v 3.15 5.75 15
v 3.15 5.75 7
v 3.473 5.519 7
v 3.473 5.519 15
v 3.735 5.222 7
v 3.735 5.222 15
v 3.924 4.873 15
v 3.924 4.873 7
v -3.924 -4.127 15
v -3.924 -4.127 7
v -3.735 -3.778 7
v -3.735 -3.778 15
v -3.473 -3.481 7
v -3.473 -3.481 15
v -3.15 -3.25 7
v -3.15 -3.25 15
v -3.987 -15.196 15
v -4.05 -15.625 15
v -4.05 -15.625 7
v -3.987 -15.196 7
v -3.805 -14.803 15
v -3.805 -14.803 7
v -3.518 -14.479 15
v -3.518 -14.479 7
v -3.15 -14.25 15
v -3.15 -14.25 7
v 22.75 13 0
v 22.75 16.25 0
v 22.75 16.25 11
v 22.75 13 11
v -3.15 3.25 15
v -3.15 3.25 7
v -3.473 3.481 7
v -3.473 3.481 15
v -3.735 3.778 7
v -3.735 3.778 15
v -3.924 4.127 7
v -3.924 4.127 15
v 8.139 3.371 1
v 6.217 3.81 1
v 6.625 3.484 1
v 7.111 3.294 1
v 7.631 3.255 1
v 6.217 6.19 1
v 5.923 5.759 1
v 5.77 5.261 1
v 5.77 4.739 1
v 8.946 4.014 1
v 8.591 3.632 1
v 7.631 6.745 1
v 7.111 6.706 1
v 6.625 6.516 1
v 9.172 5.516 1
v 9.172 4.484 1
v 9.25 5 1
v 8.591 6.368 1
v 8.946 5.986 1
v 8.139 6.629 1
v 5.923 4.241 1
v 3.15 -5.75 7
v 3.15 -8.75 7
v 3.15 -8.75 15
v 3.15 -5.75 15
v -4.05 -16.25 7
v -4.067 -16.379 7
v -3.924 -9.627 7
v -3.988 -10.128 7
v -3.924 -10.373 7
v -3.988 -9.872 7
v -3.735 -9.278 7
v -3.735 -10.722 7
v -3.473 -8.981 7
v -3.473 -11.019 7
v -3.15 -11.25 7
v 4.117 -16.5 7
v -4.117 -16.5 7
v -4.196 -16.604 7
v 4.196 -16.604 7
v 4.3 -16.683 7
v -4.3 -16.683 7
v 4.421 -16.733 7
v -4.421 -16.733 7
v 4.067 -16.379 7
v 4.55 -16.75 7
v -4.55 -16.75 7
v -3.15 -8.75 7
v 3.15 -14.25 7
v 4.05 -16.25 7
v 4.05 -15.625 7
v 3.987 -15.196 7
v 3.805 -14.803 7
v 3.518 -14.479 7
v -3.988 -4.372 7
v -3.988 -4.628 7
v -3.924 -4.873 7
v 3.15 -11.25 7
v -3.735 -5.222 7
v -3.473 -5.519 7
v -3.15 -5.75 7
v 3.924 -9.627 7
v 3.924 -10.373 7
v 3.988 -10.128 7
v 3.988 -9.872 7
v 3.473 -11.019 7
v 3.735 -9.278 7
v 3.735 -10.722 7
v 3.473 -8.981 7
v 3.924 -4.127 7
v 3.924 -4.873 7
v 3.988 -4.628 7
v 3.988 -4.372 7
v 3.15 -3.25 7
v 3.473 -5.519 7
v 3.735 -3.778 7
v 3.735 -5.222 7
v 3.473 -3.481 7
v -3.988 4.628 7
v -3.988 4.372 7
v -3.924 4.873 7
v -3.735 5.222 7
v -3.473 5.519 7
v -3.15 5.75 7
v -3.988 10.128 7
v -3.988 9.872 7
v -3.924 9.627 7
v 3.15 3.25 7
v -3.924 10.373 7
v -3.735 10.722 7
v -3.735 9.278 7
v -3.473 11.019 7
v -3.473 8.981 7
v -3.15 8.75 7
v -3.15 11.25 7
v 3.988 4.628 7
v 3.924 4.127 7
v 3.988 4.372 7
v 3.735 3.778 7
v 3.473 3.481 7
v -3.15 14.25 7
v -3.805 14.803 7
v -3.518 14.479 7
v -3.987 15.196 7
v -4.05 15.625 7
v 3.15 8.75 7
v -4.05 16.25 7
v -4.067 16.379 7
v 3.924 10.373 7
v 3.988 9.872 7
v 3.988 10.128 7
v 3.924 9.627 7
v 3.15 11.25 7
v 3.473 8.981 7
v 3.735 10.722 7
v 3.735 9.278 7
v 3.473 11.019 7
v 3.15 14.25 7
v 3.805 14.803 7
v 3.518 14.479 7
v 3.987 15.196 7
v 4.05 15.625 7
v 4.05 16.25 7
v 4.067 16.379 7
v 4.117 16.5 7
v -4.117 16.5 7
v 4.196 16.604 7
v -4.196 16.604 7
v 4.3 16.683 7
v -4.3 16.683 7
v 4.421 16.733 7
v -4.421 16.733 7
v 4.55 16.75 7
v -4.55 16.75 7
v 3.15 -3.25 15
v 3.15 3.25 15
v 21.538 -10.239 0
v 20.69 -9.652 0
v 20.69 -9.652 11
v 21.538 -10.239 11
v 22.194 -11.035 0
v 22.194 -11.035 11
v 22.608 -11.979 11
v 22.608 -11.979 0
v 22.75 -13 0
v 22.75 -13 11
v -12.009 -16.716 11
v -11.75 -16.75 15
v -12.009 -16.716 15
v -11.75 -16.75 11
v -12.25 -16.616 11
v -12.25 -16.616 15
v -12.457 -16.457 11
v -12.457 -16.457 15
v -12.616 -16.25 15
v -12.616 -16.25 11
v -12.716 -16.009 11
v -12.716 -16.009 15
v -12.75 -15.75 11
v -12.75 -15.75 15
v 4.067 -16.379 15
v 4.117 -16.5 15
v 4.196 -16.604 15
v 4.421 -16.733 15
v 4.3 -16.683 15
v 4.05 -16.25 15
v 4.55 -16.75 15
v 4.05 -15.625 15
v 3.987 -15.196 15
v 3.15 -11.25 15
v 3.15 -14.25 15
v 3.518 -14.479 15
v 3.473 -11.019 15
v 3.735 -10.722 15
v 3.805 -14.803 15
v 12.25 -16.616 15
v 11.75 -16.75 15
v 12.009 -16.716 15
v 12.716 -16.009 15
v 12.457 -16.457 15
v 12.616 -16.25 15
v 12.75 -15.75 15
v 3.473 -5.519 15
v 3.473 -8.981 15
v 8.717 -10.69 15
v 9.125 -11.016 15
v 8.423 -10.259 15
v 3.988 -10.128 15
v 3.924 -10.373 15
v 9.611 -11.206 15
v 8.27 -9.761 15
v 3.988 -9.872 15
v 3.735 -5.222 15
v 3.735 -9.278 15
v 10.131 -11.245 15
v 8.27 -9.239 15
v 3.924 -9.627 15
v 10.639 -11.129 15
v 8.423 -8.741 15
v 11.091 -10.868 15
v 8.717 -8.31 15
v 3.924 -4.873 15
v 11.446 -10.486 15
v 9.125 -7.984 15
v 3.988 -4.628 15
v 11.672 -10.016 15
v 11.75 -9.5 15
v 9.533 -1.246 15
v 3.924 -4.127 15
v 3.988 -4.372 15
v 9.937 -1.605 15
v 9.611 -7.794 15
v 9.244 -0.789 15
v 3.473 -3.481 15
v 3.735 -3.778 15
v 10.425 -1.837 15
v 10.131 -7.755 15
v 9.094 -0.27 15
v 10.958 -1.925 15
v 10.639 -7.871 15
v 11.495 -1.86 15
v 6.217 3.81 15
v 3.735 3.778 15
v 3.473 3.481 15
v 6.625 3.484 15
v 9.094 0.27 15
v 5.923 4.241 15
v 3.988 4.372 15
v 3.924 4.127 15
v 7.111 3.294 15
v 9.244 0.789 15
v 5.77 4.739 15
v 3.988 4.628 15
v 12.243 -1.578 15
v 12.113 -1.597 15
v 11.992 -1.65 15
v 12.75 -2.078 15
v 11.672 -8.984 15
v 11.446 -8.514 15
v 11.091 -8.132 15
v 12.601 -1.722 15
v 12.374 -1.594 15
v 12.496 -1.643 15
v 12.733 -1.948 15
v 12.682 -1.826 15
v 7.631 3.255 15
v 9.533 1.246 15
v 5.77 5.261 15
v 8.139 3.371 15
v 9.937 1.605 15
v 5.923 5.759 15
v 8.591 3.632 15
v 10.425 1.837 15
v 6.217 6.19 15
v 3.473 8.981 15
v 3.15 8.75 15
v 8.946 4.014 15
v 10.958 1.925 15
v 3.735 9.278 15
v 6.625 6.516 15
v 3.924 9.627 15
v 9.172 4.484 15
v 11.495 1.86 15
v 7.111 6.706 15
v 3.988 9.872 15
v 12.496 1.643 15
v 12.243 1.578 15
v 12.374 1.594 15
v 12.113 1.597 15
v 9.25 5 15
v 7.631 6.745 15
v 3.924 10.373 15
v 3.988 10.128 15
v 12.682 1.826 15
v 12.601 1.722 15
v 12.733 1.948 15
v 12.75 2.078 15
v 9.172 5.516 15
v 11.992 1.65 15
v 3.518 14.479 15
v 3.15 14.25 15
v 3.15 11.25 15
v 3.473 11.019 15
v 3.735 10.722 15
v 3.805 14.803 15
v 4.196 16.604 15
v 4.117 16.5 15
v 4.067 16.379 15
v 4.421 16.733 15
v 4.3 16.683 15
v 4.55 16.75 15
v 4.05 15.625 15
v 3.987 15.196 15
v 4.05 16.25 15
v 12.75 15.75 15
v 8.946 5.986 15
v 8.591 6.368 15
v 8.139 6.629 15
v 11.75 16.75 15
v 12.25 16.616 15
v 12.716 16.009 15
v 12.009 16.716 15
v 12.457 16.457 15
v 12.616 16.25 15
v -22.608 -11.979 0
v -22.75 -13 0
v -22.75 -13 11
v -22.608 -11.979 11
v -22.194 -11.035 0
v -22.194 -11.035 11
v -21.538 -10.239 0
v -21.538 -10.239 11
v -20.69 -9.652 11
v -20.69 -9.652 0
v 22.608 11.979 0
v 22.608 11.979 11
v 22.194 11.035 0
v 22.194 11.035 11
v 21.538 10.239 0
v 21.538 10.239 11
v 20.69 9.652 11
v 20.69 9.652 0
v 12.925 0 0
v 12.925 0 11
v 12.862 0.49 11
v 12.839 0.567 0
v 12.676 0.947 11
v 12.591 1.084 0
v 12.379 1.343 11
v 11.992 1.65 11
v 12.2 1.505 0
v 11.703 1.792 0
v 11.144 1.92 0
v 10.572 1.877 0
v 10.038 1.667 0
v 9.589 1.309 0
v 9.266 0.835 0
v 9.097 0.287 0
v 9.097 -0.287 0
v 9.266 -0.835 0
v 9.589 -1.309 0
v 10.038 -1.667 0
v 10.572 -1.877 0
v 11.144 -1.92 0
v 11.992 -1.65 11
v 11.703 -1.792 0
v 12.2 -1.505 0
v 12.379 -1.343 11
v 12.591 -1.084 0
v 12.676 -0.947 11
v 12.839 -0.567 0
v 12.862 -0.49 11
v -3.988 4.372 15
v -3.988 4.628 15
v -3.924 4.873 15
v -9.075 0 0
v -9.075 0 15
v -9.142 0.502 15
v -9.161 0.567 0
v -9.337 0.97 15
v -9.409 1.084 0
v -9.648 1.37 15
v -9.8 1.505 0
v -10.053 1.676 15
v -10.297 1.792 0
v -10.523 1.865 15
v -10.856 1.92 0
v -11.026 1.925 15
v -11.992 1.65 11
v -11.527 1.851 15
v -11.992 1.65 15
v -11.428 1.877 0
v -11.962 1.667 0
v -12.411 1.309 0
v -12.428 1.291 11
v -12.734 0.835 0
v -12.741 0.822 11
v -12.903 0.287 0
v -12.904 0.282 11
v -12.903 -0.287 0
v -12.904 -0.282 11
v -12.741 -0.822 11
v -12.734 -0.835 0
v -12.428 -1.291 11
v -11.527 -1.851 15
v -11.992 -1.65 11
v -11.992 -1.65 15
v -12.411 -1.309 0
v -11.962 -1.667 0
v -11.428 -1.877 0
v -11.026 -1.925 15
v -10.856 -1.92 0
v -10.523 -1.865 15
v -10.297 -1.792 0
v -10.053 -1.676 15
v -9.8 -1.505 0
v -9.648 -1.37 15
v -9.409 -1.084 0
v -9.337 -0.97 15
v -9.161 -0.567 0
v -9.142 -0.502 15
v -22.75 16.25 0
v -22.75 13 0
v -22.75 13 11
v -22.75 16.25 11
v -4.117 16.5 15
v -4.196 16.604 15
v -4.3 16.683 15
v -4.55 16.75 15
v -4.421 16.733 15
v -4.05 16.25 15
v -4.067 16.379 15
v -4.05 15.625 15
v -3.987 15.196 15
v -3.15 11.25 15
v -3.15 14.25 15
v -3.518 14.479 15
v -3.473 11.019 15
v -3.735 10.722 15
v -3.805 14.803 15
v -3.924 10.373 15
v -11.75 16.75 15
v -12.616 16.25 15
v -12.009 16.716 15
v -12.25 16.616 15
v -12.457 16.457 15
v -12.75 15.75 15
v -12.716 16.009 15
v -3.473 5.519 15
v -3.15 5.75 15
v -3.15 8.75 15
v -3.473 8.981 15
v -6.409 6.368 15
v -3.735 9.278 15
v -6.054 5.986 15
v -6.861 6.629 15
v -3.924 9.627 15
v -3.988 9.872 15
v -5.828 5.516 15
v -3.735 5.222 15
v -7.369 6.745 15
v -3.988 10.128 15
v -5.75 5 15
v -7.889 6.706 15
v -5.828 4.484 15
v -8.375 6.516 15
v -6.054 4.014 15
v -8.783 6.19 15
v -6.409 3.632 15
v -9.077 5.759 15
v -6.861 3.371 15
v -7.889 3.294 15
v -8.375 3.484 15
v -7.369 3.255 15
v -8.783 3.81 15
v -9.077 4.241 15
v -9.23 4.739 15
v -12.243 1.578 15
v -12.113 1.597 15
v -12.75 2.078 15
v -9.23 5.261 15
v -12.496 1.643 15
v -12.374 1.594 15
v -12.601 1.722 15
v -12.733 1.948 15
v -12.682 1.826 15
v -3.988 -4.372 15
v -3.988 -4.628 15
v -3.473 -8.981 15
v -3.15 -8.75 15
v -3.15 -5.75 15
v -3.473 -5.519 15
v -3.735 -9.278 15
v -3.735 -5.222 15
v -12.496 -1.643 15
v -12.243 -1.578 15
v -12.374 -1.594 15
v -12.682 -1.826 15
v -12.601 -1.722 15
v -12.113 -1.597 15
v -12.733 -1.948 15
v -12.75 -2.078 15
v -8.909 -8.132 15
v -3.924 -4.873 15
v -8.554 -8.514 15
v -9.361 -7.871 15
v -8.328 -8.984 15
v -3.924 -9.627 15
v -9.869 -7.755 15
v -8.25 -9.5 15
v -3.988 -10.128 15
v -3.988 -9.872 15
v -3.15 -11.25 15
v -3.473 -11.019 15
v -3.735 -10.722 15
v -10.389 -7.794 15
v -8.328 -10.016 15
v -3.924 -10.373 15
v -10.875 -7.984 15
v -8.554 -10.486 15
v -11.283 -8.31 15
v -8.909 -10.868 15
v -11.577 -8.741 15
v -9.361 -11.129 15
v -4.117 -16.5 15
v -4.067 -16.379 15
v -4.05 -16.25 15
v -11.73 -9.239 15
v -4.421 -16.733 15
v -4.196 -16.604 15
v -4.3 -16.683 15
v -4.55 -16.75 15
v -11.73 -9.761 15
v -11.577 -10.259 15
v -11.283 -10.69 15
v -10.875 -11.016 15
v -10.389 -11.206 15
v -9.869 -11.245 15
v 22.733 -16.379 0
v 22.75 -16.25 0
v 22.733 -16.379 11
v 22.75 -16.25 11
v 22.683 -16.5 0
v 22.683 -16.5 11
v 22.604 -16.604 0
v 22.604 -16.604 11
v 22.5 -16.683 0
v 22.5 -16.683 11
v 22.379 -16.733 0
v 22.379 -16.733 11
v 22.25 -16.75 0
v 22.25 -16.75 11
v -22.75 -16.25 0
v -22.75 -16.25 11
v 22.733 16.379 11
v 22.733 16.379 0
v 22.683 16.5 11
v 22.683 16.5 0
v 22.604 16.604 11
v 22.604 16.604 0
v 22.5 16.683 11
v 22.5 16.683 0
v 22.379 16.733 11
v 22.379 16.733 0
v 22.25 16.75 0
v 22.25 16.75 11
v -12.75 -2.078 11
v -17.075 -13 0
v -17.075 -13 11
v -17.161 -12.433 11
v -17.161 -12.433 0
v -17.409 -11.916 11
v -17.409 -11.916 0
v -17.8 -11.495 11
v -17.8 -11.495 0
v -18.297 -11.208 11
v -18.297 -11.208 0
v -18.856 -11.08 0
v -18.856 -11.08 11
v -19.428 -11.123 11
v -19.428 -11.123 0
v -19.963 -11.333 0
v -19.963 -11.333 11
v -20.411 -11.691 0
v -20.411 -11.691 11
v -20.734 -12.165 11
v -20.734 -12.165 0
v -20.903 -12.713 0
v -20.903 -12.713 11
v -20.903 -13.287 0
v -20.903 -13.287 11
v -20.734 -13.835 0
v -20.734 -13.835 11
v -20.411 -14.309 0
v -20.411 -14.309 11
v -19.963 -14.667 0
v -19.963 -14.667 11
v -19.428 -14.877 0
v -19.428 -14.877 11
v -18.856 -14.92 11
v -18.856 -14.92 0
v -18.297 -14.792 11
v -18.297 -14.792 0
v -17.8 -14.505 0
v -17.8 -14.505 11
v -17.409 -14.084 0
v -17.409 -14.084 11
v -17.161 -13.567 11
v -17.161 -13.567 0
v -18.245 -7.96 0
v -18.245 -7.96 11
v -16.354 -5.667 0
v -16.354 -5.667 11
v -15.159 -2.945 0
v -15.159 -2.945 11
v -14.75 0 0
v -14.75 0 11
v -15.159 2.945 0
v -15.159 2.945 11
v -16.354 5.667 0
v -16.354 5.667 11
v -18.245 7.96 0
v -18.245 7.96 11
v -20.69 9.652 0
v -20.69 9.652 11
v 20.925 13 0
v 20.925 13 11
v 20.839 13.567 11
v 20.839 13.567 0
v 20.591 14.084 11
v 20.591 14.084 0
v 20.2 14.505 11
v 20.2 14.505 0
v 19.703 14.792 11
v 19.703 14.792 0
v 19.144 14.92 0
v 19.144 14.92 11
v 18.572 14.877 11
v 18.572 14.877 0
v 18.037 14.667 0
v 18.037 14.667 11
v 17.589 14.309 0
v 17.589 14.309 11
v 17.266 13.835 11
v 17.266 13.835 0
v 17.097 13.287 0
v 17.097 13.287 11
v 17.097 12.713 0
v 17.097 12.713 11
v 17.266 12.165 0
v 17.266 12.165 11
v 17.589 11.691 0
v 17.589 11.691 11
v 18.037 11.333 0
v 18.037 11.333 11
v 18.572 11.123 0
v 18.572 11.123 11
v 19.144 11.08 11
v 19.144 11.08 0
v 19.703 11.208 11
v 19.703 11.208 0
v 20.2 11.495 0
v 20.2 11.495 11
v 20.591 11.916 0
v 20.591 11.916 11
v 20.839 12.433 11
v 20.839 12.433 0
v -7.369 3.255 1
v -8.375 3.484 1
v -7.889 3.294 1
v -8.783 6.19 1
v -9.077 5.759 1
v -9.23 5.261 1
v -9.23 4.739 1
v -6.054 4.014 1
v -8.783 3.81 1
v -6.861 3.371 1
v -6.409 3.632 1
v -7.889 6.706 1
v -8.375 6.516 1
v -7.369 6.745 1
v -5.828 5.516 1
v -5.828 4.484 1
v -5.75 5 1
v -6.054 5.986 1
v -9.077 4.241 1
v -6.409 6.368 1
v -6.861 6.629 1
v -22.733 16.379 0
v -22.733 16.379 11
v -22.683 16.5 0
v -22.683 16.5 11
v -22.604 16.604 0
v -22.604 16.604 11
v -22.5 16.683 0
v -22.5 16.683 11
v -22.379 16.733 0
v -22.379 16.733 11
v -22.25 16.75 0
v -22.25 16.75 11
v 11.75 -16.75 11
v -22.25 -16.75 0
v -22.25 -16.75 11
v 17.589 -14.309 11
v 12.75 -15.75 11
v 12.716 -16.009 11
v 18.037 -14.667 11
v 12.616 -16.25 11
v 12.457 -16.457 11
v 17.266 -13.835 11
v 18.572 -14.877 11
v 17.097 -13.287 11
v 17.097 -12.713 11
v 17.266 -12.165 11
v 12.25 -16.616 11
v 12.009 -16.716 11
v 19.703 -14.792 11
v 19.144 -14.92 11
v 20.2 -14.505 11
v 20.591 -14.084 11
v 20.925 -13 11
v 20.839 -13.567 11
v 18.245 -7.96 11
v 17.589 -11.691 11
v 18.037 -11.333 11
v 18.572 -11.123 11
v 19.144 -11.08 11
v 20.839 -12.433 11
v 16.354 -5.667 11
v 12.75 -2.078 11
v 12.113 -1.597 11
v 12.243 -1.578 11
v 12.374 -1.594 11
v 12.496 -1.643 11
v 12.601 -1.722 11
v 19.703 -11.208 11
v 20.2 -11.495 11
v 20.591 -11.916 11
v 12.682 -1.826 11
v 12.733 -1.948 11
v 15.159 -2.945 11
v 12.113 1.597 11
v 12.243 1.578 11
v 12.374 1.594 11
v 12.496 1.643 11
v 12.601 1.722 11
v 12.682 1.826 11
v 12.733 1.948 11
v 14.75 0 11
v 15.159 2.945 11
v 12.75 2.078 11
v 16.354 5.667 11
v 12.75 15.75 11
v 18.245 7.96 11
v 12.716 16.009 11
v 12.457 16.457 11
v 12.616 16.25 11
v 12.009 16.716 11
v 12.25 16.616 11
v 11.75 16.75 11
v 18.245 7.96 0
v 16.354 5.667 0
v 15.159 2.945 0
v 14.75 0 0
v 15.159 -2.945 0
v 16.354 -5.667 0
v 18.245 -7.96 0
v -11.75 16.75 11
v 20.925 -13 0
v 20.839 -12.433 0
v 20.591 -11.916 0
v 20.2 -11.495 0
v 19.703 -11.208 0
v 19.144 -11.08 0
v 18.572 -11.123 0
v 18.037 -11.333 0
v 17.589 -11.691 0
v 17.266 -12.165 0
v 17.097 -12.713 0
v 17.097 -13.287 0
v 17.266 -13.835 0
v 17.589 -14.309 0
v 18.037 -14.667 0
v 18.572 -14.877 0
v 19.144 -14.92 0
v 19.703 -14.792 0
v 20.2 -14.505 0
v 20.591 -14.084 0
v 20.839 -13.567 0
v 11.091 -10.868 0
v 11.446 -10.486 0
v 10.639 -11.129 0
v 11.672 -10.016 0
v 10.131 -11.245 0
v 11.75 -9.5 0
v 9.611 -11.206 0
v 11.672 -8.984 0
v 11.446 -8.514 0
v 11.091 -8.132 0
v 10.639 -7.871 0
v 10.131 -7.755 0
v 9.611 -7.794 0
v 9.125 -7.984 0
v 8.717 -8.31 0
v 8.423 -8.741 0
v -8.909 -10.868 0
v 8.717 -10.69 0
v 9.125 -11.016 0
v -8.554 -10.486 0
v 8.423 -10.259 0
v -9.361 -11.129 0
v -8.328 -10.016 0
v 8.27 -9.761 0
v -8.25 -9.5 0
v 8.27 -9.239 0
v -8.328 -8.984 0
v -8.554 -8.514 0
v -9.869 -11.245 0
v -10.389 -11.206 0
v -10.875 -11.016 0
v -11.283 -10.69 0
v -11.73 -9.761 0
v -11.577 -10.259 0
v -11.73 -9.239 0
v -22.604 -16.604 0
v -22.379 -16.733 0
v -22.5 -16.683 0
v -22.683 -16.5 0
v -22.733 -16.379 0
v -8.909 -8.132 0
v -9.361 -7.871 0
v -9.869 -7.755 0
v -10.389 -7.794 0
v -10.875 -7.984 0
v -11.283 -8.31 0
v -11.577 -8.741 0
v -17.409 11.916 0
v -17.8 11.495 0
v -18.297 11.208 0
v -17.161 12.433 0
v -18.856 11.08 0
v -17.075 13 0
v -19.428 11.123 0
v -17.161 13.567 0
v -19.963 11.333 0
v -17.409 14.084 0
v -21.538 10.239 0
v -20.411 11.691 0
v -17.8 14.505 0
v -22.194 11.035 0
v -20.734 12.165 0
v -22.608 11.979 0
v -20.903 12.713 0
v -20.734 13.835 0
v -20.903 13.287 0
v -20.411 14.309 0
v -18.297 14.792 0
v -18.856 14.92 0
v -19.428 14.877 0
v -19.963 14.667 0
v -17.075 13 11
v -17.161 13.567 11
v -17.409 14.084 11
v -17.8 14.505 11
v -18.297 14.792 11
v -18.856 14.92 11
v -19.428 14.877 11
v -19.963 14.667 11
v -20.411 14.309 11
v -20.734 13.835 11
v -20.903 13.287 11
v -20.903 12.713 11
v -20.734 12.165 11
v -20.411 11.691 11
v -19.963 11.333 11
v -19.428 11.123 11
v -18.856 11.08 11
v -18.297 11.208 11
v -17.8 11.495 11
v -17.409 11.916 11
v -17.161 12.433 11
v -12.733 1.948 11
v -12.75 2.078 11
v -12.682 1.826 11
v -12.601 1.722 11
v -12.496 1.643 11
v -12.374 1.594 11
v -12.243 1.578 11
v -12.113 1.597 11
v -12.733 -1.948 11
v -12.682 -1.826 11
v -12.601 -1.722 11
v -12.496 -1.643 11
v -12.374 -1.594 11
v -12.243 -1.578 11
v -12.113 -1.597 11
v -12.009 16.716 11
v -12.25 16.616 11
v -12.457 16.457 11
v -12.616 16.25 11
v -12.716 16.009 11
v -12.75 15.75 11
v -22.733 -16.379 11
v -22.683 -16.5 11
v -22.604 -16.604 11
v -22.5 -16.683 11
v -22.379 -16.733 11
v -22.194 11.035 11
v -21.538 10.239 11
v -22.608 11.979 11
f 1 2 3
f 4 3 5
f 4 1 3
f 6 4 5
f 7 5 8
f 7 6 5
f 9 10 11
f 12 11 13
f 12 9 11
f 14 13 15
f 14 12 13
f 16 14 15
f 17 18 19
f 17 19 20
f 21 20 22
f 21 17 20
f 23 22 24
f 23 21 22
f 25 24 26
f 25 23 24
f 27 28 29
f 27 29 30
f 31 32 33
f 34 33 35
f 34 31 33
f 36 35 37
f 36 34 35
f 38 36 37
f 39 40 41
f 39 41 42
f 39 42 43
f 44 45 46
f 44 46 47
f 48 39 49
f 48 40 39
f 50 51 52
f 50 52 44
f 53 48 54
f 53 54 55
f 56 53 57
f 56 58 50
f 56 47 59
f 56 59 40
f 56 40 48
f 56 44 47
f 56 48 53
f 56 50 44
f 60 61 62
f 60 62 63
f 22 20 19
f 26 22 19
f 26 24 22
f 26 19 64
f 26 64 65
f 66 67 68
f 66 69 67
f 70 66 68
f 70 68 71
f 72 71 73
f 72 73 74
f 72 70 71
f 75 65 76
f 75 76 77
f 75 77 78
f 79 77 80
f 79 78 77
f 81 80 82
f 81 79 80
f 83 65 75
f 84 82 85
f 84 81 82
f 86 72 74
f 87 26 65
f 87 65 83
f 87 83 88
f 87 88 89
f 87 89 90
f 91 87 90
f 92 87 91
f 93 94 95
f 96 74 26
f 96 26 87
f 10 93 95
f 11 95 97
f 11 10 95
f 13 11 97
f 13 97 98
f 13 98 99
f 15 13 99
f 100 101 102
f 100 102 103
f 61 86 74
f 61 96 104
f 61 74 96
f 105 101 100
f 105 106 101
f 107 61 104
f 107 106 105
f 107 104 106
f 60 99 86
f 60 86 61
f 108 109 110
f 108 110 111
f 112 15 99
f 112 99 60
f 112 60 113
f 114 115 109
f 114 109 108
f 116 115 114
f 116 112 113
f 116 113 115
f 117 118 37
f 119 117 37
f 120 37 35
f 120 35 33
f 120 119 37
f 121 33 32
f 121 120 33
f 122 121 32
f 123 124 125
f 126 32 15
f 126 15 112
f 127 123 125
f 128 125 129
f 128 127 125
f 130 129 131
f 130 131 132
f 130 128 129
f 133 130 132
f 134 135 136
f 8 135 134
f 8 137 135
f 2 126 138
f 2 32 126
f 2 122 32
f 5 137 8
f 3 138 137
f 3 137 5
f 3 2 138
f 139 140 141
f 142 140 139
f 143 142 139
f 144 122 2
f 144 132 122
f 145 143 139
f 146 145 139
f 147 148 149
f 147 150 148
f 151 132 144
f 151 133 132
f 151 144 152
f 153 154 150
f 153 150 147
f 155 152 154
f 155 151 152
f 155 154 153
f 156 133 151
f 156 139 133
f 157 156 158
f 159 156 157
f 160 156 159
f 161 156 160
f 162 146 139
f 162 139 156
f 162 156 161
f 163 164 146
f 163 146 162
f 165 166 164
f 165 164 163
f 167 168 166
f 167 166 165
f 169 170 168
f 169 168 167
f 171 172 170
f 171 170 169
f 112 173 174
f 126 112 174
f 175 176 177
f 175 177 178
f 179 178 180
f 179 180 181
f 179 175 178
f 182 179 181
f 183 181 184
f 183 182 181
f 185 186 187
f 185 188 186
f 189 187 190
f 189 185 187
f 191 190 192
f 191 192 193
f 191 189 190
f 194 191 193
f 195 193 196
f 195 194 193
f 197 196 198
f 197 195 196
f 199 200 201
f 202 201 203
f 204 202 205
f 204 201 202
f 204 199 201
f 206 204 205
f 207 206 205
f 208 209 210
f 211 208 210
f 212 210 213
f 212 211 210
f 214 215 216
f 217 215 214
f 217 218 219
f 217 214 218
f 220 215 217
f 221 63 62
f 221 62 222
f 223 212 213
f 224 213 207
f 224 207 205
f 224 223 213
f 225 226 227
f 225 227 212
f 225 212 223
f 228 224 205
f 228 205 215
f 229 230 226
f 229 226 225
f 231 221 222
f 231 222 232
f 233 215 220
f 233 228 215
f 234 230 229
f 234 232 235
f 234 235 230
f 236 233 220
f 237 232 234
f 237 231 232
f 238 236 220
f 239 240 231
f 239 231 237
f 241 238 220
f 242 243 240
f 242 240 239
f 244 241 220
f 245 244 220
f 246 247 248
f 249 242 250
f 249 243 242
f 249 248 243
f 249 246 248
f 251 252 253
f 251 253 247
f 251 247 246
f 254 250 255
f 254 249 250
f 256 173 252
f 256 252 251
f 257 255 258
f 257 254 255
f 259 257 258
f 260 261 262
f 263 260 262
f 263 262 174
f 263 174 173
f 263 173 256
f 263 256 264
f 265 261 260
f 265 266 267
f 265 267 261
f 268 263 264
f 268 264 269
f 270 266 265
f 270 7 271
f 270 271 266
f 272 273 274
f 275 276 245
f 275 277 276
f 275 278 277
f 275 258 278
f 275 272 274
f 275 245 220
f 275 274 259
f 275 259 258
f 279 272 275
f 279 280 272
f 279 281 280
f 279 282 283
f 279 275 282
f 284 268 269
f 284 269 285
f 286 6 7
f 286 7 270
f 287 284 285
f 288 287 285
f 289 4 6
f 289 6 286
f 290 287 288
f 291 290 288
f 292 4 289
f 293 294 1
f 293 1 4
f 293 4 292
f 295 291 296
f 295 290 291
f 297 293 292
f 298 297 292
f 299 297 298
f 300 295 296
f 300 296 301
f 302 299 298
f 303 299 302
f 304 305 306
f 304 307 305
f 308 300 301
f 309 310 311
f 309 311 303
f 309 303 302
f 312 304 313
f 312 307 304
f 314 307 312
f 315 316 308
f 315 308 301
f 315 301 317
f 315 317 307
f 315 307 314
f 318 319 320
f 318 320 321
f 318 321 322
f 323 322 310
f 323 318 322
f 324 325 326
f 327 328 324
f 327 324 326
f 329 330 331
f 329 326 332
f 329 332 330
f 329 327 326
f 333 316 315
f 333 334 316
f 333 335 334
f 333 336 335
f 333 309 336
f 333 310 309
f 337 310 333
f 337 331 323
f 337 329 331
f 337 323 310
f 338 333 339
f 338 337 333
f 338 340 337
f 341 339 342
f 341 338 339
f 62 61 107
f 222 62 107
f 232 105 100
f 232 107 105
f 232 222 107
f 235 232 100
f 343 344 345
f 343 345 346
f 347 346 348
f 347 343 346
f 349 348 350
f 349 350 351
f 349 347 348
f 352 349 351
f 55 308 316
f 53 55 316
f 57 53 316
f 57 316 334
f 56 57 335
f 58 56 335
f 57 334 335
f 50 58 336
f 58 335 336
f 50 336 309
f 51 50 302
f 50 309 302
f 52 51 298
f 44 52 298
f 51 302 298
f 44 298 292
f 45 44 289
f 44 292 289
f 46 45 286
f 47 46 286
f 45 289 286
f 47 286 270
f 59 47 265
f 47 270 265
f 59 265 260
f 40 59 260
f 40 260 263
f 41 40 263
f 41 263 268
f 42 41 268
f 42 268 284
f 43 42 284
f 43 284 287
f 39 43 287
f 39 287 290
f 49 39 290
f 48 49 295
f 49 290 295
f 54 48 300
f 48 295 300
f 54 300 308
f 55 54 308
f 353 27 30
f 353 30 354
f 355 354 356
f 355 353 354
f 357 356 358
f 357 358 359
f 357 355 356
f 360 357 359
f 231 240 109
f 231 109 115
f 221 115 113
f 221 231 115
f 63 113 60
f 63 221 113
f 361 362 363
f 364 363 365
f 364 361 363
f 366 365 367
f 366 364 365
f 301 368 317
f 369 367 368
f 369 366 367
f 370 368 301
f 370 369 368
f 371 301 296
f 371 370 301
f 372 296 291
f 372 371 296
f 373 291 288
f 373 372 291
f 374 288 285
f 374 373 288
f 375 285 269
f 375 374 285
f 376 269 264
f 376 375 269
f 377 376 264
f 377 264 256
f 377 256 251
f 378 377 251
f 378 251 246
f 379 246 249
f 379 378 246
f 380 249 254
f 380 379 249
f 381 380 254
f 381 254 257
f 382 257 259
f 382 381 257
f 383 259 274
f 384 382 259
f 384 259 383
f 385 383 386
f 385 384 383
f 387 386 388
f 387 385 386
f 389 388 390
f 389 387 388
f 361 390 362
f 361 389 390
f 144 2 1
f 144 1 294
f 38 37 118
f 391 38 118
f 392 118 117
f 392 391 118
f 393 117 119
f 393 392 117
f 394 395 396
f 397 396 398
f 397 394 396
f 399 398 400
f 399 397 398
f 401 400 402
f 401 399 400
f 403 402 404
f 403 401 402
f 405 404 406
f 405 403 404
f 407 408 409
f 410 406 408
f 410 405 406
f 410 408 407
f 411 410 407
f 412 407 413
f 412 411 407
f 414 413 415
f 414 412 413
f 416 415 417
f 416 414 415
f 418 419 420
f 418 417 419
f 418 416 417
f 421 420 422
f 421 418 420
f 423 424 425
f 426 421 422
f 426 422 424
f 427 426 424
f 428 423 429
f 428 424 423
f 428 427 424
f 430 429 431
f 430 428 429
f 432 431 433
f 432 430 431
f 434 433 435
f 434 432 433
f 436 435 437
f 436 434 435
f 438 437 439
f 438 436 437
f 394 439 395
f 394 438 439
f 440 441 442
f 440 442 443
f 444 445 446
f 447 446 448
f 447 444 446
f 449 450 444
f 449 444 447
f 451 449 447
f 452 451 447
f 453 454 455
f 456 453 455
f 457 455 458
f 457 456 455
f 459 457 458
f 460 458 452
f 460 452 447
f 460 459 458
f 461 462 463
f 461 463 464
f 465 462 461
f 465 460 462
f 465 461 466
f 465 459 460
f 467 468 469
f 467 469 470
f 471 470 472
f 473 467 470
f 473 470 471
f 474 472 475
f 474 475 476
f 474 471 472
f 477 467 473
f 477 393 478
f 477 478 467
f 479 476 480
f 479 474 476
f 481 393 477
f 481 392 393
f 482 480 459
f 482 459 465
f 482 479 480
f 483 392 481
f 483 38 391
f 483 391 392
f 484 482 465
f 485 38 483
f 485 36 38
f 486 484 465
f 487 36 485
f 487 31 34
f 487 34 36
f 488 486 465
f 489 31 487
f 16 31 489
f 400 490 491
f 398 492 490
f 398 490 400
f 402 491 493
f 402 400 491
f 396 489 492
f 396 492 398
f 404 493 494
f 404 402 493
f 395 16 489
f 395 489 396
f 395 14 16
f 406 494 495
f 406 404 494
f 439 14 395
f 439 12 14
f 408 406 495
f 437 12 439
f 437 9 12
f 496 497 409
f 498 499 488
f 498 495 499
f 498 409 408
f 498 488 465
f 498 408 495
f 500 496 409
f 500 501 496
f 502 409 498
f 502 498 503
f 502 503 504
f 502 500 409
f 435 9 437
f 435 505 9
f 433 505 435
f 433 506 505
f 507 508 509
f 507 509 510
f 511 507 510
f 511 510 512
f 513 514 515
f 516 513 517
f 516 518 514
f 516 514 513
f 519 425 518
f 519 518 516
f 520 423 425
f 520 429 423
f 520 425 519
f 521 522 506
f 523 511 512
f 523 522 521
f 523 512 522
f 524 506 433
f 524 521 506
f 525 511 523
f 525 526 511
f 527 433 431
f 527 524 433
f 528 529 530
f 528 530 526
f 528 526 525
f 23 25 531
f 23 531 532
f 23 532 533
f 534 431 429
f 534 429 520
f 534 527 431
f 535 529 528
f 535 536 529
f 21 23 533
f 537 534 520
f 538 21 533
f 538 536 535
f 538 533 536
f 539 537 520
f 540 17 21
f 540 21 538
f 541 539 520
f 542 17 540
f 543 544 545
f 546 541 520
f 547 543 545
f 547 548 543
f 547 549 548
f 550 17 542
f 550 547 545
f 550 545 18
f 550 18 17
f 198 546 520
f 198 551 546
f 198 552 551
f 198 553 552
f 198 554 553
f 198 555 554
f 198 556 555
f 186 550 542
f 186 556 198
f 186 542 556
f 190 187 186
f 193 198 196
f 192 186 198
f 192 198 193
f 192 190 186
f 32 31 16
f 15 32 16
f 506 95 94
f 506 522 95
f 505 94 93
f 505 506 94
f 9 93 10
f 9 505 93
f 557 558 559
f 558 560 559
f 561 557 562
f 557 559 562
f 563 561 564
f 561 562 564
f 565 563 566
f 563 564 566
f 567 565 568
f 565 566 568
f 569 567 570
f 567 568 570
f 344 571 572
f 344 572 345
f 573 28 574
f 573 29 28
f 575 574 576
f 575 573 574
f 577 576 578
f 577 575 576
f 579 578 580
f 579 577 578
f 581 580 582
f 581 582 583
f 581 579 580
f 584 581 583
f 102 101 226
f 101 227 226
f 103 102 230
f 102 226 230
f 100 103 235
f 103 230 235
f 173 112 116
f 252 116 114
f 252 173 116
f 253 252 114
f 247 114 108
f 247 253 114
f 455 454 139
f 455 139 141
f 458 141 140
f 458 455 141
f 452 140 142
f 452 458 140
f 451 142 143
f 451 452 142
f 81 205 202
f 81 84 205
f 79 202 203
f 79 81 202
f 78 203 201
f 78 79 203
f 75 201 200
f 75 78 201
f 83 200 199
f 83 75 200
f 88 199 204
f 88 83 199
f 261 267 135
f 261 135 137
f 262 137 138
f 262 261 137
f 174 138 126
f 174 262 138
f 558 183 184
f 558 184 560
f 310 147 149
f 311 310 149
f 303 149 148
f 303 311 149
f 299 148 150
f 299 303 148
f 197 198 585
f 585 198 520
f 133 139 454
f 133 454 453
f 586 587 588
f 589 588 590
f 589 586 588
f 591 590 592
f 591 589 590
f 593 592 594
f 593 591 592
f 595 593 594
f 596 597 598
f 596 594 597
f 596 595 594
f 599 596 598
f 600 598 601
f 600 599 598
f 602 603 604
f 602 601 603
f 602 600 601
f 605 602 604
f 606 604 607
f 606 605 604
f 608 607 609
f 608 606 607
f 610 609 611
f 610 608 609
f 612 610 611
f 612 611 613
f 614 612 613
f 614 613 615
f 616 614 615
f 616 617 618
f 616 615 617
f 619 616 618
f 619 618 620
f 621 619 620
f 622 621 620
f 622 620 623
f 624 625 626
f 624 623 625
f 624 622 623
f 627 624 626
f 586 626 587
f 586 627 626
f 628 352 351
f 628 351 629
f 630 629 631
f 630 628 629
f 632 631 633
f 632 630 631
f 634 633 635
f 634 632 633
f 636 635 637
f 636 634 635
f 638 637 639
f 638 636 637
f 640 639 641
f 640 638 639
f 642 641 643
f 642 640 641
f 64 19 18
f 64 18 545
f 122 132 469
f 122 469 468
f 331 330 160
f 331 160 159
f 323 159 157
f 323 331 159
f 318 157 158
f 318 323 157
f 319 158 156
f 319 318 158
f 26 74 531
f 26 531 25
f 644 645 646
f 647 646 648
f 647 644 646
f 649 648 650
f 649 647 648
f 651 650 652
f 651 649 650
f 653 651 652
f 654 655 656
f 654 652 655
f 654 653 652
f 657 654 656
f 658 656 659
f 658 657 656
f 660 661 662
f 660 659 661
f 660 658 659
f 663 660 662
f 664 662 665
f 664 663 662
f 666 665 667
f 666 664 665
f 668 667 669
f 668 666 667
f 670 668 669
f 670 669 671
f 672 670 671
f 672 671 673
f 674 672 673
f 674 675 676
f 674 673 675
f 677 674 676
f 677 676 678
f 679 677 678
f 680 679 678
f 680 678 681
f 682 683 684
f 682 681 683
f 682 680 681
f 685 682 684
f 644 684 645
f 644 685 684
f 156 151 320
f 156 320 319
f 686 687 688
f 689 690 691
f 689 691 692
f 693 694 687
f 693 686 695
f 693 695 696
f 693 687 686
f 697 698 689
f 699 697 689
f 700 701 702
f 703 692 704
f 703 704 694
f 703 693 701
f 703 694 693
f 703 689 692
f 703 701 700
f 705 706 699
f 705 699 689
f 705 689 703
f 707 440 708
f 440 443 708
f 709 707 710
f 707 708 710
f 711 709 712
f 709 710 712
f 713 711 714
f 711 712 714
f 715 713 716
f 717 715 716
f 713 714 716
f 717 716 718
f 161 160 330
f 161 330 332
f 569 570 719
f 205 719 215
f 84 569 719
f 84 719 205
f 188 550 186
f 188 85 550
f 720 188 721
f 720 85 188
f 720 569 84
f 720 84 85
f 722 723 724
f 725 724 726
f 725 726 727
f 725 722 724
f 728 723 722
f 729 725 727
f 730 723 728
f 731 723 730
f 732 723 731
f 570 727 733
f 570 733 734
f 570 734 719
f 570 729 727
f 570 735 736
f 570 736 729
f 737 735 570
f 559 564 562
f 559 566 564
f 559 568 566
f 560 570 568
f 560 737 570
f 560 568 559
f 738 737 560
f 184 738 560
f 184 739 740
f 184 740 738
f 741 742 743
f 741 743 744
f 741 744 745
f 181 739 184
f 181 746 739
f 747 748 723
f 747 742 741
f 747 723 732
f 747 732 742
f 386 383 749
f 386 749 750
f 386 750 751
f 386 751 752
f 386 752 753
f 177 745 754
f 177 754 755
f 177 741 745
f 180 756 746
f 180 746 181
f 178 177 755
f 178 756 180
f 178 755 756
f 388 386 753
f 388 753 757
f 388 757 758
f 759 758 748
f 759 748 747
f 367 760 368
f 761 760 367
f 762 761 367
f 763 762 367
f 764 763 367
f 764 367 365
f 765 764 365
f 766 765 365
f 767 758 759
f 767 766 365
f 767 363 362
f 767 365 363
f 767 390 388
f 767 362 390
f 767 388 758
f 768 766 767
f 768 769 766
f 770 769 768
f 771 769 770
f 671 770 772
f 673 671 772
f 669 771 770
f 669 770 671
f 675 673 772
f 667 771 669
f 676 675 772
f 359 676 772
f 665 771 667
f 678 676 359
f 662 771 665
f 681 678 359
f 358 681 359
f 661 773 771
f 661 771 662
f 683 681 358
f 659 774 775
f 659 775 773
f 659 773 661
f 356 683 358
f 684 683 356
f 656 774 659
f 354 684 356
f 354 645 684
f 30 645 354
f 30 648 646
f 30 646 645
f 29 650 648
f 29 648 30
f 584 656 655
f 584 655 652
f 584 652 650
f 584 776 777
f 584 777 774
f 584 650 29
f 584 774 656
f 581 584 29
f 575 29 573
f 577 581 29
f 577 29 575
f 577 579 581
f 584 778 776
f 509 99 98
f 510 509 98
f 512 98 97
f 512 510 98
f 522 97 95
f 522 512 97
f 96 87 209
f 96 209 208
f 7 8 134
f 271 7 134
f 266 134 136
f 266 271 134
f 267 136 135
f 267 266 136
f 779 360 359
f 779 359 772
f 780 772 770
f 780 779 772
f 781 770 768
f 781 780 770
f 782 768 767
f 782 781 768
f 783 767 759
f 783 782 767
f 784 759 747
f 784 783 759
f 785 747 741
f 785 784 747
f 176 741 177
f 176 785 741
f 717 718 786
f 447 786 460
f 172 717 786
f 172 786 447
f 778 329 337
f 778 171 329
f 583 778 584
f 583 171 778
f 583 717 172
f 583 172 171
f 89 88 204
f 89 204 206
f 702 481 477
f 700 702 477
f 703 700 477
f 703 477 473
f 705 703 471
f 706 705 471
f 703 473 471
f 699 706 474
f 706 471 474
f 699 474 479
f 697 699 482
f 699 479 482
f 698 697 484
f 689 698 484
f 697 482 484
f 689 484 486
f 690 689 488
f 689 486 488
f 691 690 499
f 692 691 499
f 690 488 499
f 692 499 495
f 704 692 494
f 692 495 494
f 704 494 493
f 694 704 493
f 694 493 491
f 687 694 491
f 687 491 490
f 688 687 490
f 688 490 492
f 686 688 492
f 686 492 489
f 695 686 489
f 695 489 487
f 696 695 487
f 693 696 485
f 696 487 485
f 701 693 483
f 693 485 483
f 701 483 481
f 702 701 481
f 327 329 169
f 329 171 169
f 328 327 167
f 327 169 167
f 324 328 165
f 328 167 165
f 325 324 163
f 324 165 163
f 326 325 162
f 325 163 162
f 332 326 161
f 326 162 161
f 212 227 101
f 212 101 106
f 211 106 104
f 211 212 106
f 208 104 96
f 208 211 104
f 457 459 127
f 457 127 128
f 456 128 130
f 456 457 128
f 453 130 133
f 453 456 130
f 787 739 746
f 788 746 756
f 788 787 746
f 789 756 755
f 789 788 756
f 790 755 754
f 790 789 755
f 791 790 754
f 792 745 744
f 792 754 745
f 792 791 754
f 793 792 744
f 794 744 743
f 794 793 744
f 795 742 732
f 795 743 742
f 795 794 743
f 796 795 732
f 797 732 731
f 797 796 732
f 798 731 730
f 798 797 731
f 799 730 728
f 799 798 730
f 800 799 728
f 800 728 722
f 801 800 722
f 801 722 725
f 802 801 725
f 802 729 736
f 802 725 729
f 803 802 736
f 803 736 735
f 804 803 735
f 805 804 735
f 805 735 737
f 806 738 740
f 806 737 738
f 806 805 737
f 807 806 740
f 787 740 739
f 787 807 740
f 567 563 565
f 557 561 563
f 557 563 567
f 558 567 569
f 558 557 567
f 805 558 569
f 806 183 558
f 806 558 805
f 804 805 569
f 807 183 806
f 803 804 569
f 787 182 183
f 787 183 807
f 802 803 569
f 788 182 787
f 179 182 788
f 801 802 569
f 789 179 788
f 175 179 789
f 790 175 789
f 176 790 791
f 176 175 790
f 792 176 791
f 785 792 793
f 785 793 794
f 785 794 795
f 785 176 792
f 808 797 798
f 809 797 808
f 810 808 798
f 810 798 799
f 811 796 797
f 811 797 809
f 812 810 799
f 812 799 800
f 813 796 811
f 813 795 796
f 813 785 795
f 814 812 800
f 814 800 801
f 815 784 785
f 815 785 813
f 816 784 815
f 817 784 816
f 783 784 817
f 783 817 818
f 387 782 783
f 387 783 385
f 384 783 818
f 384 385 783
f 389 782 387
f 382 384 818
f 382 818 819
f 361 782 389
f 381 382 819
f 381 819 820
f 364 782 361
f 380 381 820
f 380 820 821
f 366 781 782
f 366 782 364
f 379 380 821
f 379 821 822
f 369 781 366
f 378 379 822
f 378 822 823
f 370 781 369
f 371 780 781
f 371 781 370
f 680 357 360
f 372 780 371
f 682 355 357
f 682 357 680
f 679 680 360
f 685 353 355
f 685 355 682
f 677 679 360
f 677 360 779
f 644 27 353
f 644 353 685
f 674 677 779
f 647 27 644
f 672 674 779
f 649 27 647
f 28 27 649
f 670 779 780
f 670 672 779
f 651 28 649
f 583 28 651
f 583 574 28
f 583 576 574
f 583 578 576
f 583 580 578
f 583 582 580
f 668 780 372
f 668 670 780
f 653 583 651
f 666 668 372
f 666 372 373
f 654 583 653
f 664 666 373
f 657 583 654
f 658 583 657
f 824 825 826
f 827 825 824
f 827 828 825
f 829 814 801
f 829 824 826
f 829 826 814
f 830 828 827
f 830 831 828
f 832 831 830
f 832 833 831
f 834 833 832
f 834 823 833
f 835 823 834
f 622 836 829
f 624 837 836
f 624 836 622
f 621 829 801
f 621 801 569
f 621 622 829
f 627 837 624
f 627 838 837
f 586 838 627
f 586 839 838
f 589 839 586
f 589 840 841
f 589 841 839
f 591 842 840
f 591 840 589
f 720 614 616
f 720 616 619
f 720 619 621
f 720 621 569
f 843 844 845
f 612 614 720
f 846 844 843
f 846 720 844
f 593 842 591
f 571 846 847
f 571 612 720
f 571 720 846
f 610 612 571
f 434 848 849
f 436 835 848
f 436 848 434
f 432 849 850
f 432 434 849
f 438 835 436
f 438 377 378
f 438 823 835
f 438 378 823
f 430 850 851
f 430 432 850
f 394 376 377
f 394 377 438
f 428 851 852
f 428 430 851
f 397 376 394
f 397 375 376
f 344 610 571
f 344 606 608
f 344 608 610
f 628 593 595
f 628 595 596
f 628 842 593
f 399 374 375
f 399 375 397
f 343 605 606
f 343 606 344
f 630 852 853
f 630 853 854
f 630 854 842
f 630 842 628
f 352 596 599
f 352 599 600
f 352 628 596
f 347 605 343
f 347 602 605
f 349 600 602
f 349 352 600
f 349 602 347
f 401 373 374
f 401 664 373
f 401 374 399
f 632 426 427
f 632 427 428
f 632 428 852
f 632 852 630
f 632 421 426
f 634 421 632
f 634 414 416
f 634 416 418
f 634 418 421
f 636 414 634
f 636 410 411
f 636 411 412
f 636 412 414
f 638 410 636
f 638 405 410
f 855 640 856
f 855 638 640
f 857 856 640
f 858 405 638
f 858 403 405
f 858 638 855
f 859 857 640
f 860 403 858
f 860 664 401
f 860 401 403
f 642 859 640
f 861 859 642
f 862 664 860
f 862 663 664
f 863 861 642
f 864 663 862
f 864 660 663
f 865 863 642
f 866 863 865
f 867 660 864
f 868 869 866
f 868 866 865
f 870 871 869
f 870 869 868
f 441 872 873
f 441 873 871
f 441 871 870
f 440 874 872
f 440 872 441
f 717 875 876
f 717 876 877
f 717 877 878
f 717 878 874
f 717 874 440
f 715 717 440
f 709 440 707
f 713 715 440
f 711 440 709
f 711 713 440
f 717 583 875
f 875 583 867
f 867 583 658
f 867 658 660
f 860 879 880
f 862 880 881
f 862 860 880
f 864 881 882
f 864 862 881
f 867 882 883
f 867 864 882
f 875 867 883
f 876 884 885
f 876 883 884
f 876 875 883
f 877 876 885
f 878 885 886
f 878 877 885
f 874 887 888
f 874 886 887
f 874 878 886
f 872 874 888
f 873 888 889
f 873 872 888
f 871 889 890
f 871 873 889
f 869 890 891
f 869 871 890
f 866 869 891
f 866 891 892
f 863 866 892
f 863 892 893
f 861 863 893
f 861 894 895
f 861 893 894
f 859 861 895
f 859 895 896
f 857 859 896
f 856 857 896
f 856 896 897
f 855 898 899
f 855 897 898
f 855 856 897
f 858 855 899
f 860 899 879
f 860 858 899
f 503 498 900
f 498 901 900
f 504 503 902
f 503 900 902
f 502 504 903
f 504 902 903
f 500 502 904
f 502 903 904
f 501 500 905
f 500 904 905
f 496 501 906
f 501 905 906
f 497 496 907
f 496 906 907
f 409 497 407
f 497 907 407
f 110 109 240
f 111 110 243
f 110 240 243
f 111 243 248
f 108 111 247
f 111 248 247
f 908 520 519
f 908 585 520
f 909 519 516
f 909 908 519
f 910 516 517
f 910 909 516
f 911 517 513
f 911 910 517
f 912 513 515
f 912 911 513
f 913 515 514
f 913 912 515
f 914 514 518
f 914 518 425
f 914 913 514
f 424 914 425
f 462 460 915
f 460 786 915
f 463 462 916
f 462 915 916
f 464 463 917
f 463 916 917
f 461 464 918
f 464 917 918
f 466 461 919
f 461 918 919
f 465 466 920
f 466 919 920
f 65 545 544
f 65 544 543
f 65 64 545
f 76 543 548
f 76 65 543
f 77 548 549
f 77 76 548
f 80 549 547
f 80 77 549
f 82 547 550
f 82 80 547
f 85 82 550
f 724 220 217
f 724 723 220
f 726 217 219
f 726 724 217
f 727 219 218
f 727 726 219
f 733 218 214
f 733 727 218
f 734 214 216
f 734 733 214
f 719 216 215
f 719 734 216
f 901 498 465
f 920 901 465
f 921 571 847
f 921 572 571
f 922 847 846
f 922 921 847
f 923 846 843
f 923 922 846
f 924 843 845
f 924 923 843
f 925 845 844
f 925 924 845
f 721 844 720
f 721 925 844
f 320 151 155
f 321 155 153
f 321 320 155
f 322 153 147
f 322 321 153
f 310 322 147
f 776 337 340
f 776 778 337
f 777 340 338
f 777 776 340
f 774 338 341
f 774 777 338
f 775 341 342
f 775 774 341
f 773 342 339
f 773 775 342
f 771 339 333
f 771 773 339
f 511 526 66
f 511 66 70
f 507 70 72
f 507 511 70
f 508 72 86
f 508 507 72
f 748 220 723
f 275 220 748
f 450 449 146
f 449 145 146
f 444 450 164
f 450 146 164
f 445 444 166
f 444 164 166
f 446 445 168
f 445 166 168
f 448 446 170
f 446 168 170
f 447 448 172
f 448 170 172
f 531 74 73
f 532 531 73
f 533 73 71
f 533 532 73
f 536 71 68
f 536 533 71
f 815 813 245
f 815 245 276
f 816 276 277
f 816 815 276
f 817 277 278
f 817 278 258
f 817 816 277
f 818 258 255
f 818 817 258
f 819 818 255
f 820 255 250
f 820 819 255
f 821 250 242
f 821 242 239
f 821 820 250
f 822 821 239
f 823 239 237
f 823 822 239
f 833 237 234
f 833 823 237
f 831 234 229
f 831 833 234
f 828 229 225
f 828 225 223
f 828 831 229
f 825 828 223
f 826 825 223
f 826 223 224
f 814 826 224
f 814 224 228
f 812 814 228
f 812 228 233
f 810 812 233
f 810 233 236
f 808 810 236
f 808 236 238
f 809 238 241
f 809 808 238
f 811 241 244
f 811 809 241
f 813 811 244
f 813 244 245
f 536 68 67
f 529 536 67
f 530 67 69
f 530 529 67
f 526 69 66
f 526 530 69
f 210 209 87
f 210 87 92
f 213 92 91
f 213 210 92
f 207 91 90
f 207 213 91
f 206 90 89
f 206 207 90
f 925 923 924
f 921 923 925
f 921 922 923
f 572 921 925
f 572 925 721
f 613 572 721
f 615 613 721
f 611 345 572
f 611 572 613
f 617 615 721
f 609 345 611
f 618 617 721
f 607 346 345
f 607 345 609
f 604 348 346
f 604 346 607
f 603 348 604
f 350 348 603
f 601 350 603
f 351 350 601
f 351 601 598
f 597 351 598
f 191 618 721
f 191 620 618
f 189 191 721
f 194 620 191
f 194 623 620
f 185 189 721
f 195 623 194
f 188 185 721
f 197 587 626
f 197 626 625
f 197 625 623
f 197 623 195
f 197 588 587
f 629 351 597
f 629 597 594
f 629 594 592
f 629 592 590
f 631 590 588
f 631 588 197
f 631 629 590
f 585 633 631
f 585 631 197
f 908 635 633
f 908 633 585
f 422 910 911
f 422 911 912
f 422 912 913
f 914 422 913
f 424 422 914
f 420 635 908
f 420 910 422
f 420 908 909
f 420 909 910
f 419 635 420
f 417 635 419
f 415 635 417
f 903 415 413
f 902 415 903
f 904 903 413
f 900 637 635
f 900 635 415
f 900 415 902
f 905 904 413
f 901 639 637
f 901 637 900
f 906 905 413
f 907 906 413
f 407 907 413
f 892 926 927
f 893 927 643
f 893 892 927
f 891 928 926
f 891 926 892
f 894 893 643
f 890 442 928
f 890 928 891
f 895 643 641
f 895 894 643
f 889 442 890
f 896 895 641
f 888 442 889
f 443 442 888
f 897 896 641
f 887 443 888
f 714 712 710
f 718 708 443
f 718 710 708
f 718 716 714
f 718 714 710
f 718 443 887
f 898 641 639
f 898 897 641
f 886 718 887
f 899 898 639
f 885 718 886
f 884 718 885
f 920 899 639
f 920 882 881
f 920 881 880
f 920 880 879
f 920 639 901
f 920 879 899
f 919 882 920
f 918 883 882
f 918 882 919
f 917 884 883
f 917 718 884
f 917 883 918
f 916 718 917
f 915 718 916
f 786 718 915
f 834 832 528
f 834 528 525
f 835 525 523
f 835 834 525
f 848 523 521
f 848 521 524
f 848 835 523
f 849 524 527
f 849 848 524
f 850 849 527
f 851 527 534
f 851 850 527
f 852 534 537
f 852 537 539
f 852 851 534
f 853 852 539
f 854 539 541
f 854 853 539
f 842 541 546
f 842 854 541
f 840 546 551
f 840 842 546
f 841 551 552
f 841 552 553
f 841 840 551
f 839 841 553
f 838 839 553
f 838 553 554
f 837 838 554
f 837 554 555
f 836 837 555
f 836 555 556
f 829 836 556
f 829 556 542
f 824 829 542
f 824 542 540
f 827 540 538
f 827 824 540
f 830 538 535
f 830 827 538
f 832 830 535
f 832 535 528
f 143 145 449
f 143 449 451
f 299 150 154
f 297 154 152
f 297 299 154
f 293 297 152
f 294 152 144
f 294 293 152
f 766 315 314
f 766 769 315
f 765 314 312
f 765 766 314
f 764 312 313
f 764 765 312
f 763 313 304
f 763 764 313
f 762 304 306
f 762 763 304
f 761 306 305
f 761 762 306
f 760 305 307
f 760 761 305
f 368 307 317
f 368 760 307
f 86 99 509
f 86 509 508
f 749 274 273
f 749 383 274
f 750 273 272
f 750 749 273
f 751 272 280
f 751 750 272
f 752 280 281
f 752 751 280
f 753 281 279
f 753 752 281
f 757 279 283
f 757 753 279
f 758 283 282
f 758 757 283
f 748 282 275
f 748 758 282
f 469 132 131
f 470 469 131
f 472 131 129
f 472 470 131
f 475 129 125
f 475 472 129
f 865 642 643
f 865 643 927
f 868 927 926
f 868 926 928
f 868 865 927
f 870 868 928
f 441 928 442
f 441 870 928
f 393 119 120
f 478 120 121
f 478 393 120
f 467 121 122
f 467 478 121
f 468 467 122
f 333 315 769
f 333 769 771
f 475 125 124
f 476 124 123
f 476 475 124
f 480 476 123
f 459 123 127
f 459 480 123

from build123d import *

# Parameters (mm, degrees)
SKETCH1_R           = 1.75
SKETCH1_R_2         = 1.925
BOSS_EXTRUDE1_DEPTH = 15
CUT_EXTRUDE1_DEPTH  = 8
SKETCH5_W           = 11
SKETCH5_H           = 33.5
CUT_EXTRUDE6_DEPTH  = 4
SKETCH8_R           = 1.75
CUT_EXTRUDE9_DEPTH  = 14
FILLET1_R           = 1.75
FILLET2_R           = 1
FILLET3_R           = 0.5
FILLET4_R           = 1.5


with BuildPart() as part:
    # Sketch1 → Boss-Extrude1 (new body)
    with BuildSketch(Plane.XY):
        with BuildLine():
            Line((-19, 16.75), (19, 16.75))
            Line((19, 16.75), (22.75, 16.75))
            Line((22.75, 16.75), (22.75, 13))
            ThreePointArc((22.75, 13), (22.193718688, 11.034634654), (20.689914163, 9.652360515))
            ThreePointArc((20.689914163, 9.652360515), (14.75, 0), (20.689914163, -9.652360515))
            ThreePointArc((20.689914163, -9.652360515), (22.193718688, -11.034634654), (22.75, -13))
            Line((22.75, -13), (22.75, -16.75))
            Line((22.75, -16.75), (19, -16.75))
            Line((19, -16.75), (-19, -16.75))
            Line((-19, -16.75), (-22.75, -16.75))
            Line((-22.75, -16.75), (-22.75, -13))
            ThreePointArc((-22.75, -13), (-22.193718688, -11.034634654), (-20.689914163, -9.652360515))
            ThreePointArc((-20.689914163, -9.652360515), (-14.75, 0), (-20.689914163, 9.652360515))
            ThreePointArc((-20.689914163, 9.652360515), (-22.193718688, 11.034634654), (-22.75, 13))
            Line((-22.75, 13), (-22.75, 16.75))
            Line((-22.75, 16.75), (-19, 16.75))
        make_face()
        with Locations((-10, -9.5)):
            Circle(SKETCH1_R, mode=Mode.SUBTRACT)
        with Locations((10, -9.5)):
            Circle(SKETCH1_R, mode=Mode.SUBTRACT)
        with Locations((19, 13)):
            Circle(SKETCH1_R_2, mode=Mode.SUBTRACT)
        with Locations((-19, 13)):
            Circle(SKETCH1_R_2, mode=Mode.SUBTRACT)
        with Locations((-19, -13)):
            Circle(SKETCH1_R_2, mode=Mode.SUBTRACT)
        with Locations((19, -13)):
            Circle(SKETCH1_R_2, mode=Mode.SUBTRACT)
        with Locations((-11, 0)):
            Circle(SKETCH1_R_2, mode=Mode.SUBTRACT)
        with Locations((11, 0)):
            Circle(SKETCH1_R_2, mode=Mode.SUBTRACT)
    extrude(amount=BOSS_EXTRUDE1_DEPTH)

    # Sketch2 → Cut-Extrude1 (cut)
    with BuildSketch(Plane.XY.offset(15)):
        Polygon((-4.049999999, 16.75), (-4.049999999, 14.25), (-3.149999999, 14.25), (-3.149999999, 11.25), (-4.049999999, 11.25), (-4.049999999, 8.75), (-3.149999999, 8.75), (-3.149999999, 5.75), (-4.049999999, 5.75), (-4.049999999, 3.25), (-3.149999999, 3.25), (-3.149999999, -3.25), (-4.049999999, -3.25), (-4.049999999, -5.75), (-3.149999999, -5.75), (-3.149999999, -8.75), (-4.049999999, -8.75), (-4.049999999, -11.25), (-3.149999999, -11.25), (-3.149999999, -14.25), (-4.049999999, -14.25), (-4.049999999, -16.75), (4.050000001, -16.75), (4.050000001, -14.25), (3.150000001, -14.25), (3.150000001, -11.25), (4.050000001, -11.25), (4.050000001, -8.75), (3.150000001, -8.75), (3.150000001, -5.75), (4.050000001, -5.75), (4.050000001, -3.25), (3.150000001, -3.25), (3.150000001, 3.25), (4.050000001, 3.25), (4.050000001, 5.75), (3.150000001, 5.75), (3.150000001, 8.75), (4.050000001, 8.75), (4.050000001, 11.25), (3.150000001, 11.25), (3.150000001, 14.25), (4.050000001, 14.25), (4.050000001, 16.75), align=None)
    extrude(amount=-CUT_EXTRUDE1_DEPTH, mode=Mode.SUBTRACT)

    # Sketch5 → Cut-Extrude6 (cut)
    with BuildSketch(Plane.XY.offset(15)):
        with Locations((-18.25, 0)):
            Rectangle(SKETCH5_W, SKETCH5_H)
        with Locations((18.25, 0)):
            Rectangle(SKETCH5_W, SKETCH5_H)
    extrude(amount=-CUT_EXTRUDE6_DEPTH, mode=Mode.SUBTRACT)

    # Sketch8 → Cut-Extrude9 (cut)
    with BuildSketch(Plane.XY.offset(15)):
        with Locations((7.5, 5)):
            Circle(SKETCH8_R)
        with Locations((-7.5, 5)):
            Circle(SKETCH8_R)
    extrude(amount=-CUT_EXTRUDE9_DEPTH, mode=Mode.SUBTRACT)

    # Fillet1
    # the kernel refuses this fillet: 1.75 mm, written as the material it adds along each edge
    with BuildSketch(Plane(origin=(-4.049999999, 11.25, 15), x_dir=(1, 0, 0), z_dir=(0, 0, -1)), Plane(origin=(-4.049999999, 5.75, 15), x_dir=(1, 0, 0), z_dir=(0, 0, -1)), Plane(origin=(-4.049999999, -3.25, 15), x_dir=(1, 0, 0), z_dir=(0, 0, -1)), Plane(origin=(-4.049999999, -8.75, 15), x_dir=(1, 0, 0), z_dir=(0, 0, -1)), Plane(origin=(4.050000001, -11.25, 15), x_dir=(-1, 0, 0), z_dir=(0, 0, -1))) as fillet1_piece_1:
        with BuildLine():
            CenterArc((1.75, 1.529705854), FILLET1_R, 180, 60.940718932)
            Line((0, 1.529705854), (-0.035, 1.529705854))
            Line((-0.035, 1.529705854), (-0.035, 0))
            Line((-0.035, 0), (0, -0.035))
            ThreePointArc((0, -0.035), (0.45, -0.035), (0.883, -0.030594117))
            Line((0.883, -0.030594117), (0.9, 0))
        make_face()
    extrude(amount=11.824264635)
    with BuildSketch(Plane(origin=(4.050000001, 11.25, 15), x_dir=(-1, 0, 0), z_dir=(0, 0, -1)), Plane(origin=(4.050000001, 5.75, 15), x_dir=(-1, 0, 0), z_dir=(0, 0, -1)), Plane(origin=(4.050000001, -3.25, 15), x_dir=(-1, 0, 0), z_dir=(0, 0, -1))) as fillet1_piece_2:
        with BuildLine():
            CenterArc((1.75, -1.529705854), FILLET1_R, 119.059281068, 60.940718932)
            Line((0, -1.529705854), (-0.035, -1.529705854))
            Line((-0.035, -1.529705854), (-0.035, 0))
            Line((-0.035, 0), (0, 0.035))
            ThreePointArc((0, 0.035), (0.45, 0.035), (0.883, 0.030594117))
            Line((0.883, 0.030594117), (0.9, 0))
        make_face()
    extrude(amount=11.824264635)
    with BuildSketch(Plane(origin=(4.050000001, -8.75, 15), x_dir=(0, -1, 0), z_dir=(0, 0, -1)), Plane(origin=(-4.049999999, 8.75, 15), x_dir=(0, 1, 0), z_dir=(0, 0, -1)), Plane(origin=(-4.049999999, 3.25, 15), x_dir=(0, 1, 0), z_dir=(0, 0, -1)), Plane(origin=(-4.049999999, -5.75, 15), x_dir=(0, 1, 0), z_dir=(0, 0, -1)), Plane(origin=(-4.049999999, -11.25, 15), x_dir=(0, 1, 0), z_dir=(0, 0, -1))) as fillet1_piece_3:
        with BuildLine():
            CenterArc((1.529705854, 1.75), FILLET1_R, 209.059281068, 60.940718932)
            Line((0, 0.9), (-0.030594117, 0.883))
            ThreePointArc((-0.030594117, 0.883), (-0.035, 0.45), (-0.035, 0))
            Line((-0.035, 0), (0, -0.035))
            Line((0, -0.035), (1.529705854, -0.035))
            Line((1.529705854, -0.035), (1.529705854, 0))
        make_face()
    extrude(amount=11.824264635)
    with BuildSketch(Plane(origin=(4.050000001, -5.75, 15), x_dir=(0, 1, 0), z_dir=(0, 0, -1)), Plane(origin=(4.050000001, 3.25, 15), x_dir=(0, 1, 0), z_dir=(0, 0, -1)), Plane(origin=(4.050000001, 8.75, 15), x_dir=(0, 1, 0), z_dir=(0, 0, -1))) as fillet1_piece_4:
        with BuildLine():
            CenterArc((1.529705854, -1.75), FILLET1_R, 90, 60.940718932)
            Line((0, -0.9), (-0.030594117, -0.883))
            ThreePointArc((-0.030594117, -0.883), (-0.035, -0.45), (-0.035, 0))
            Line((-0.035, 0), (0, 0.035))
            Line((0, 0.035), (1.529705854, 0.035))
            Line((1.529705854, 0.035), (1.529705854, 0))
        make_face()
    extrude(amount=11.824264635)

    # Fillet2
    fillet2_edges = [part.edges().sort_by_distance(p)[0] for p in [
        (-12.75, -16.75, 13),
        (-12.75, 16.75, 13),
        (12.75, 16.75, 13),
        (12.75, -16.75, 13),
        (-4.027502426, 10, 11),
        (-4.027502426, 4.5, 11),
        (-4.027502426, -4.5, 11),
        (-4.027502426, -10, 11),
        (4.027502428, 10, 11),
        (4.027502428, 4.5, 11),
        (4.027502428, -4.5, 11),
        (4.027502428, -10, 11),
    ]]
    fillet(fillet2_edges, radius=FILLET2_R)

    # Fillet3
    fillet3_edges = [part.edges().sort_by_distance(p)[0] for p in [
        (-4.049999999, 16.75, 11),
        (4.050000001, 16.75, 11),
        (4.050000001, -16.75, 11),
        (-4.049999999, -16.75, 11),
        (-12.75, 0.801950747, 13),
        (-12.75, -0.801950747, 13),
        (-22.75, -16.75, 5.5),
        (-22.75, 16.75, 5.5),
        (12.75, -0.801950747, 13),
        (12.75, 0.801950747, 13),
        (22.75, -16.75, 5.5),
        (22.75, 16.75, 5.5),
    ]]
    fillet(fillet3_edges, radius=FILLET3_R)

    # Fillet4
    # the kernel refuses this fillet: 1.5 mm, written as the material it adds along each edge
    with BuildSketch(Plane(origin=(-4.049999999, 14.25, 15), x_dir=(1, 0, 0), z_dir=(0, 0, -1)), Plane(origin=(4.050000001, -14.25, 15), x_dir=(-1, 0, 0), z_dir=(0, 0, -1))) as fillet4_piece_1:
        with BuildLine():
            CenterArc((1.5, -1.374772708), FILLET4_R, 113.578178478, 66.421821522)
            Line((0, -1.374772708), (-0.03, -1.374772708))
            Line((-0.03, -1.374772708), (-0.03, 0))
            Line((-0.03, 0), (0, 0.03))
            ThreePointArc((0, 0.03), (0.45, 0.03), (0.888, 0.027495454))
            Line((0.888, 0.027495454), (0.9, 0))
        make_face()
    extrude(amount=11.436931771)
    with BuildSketch(Plane(origin=(4.050000001, 14.25, 15), x_dir=(-1, 0, 0), z_dir=(0, 0, -1)), Plane(origin=(-4.049999999, -14.25, 15), x_dir=(1, 0, 0), z_dir=(0, 0, -1))) as fillet4_piece_2:
        with BuildLine():
            CenterArc((1.5, 1.374772708), FILLET4_R, 180, 66.421821522)
            Line((0, 1.374772708), (-0.03, 1.374772708))
            Line((-0.03, 1.374772708), (-0.03, 0))
            Line((-0.03, 0), (0, -0.03))
            ThreePointArc((0, -0.03), (0.45, -0.03), (0.888, -0.027495454))
            Line((0.888, -0.027495454), (0.9, 0))
        make_face()
    extrude(amount=11.436931771)


solid = part.part
